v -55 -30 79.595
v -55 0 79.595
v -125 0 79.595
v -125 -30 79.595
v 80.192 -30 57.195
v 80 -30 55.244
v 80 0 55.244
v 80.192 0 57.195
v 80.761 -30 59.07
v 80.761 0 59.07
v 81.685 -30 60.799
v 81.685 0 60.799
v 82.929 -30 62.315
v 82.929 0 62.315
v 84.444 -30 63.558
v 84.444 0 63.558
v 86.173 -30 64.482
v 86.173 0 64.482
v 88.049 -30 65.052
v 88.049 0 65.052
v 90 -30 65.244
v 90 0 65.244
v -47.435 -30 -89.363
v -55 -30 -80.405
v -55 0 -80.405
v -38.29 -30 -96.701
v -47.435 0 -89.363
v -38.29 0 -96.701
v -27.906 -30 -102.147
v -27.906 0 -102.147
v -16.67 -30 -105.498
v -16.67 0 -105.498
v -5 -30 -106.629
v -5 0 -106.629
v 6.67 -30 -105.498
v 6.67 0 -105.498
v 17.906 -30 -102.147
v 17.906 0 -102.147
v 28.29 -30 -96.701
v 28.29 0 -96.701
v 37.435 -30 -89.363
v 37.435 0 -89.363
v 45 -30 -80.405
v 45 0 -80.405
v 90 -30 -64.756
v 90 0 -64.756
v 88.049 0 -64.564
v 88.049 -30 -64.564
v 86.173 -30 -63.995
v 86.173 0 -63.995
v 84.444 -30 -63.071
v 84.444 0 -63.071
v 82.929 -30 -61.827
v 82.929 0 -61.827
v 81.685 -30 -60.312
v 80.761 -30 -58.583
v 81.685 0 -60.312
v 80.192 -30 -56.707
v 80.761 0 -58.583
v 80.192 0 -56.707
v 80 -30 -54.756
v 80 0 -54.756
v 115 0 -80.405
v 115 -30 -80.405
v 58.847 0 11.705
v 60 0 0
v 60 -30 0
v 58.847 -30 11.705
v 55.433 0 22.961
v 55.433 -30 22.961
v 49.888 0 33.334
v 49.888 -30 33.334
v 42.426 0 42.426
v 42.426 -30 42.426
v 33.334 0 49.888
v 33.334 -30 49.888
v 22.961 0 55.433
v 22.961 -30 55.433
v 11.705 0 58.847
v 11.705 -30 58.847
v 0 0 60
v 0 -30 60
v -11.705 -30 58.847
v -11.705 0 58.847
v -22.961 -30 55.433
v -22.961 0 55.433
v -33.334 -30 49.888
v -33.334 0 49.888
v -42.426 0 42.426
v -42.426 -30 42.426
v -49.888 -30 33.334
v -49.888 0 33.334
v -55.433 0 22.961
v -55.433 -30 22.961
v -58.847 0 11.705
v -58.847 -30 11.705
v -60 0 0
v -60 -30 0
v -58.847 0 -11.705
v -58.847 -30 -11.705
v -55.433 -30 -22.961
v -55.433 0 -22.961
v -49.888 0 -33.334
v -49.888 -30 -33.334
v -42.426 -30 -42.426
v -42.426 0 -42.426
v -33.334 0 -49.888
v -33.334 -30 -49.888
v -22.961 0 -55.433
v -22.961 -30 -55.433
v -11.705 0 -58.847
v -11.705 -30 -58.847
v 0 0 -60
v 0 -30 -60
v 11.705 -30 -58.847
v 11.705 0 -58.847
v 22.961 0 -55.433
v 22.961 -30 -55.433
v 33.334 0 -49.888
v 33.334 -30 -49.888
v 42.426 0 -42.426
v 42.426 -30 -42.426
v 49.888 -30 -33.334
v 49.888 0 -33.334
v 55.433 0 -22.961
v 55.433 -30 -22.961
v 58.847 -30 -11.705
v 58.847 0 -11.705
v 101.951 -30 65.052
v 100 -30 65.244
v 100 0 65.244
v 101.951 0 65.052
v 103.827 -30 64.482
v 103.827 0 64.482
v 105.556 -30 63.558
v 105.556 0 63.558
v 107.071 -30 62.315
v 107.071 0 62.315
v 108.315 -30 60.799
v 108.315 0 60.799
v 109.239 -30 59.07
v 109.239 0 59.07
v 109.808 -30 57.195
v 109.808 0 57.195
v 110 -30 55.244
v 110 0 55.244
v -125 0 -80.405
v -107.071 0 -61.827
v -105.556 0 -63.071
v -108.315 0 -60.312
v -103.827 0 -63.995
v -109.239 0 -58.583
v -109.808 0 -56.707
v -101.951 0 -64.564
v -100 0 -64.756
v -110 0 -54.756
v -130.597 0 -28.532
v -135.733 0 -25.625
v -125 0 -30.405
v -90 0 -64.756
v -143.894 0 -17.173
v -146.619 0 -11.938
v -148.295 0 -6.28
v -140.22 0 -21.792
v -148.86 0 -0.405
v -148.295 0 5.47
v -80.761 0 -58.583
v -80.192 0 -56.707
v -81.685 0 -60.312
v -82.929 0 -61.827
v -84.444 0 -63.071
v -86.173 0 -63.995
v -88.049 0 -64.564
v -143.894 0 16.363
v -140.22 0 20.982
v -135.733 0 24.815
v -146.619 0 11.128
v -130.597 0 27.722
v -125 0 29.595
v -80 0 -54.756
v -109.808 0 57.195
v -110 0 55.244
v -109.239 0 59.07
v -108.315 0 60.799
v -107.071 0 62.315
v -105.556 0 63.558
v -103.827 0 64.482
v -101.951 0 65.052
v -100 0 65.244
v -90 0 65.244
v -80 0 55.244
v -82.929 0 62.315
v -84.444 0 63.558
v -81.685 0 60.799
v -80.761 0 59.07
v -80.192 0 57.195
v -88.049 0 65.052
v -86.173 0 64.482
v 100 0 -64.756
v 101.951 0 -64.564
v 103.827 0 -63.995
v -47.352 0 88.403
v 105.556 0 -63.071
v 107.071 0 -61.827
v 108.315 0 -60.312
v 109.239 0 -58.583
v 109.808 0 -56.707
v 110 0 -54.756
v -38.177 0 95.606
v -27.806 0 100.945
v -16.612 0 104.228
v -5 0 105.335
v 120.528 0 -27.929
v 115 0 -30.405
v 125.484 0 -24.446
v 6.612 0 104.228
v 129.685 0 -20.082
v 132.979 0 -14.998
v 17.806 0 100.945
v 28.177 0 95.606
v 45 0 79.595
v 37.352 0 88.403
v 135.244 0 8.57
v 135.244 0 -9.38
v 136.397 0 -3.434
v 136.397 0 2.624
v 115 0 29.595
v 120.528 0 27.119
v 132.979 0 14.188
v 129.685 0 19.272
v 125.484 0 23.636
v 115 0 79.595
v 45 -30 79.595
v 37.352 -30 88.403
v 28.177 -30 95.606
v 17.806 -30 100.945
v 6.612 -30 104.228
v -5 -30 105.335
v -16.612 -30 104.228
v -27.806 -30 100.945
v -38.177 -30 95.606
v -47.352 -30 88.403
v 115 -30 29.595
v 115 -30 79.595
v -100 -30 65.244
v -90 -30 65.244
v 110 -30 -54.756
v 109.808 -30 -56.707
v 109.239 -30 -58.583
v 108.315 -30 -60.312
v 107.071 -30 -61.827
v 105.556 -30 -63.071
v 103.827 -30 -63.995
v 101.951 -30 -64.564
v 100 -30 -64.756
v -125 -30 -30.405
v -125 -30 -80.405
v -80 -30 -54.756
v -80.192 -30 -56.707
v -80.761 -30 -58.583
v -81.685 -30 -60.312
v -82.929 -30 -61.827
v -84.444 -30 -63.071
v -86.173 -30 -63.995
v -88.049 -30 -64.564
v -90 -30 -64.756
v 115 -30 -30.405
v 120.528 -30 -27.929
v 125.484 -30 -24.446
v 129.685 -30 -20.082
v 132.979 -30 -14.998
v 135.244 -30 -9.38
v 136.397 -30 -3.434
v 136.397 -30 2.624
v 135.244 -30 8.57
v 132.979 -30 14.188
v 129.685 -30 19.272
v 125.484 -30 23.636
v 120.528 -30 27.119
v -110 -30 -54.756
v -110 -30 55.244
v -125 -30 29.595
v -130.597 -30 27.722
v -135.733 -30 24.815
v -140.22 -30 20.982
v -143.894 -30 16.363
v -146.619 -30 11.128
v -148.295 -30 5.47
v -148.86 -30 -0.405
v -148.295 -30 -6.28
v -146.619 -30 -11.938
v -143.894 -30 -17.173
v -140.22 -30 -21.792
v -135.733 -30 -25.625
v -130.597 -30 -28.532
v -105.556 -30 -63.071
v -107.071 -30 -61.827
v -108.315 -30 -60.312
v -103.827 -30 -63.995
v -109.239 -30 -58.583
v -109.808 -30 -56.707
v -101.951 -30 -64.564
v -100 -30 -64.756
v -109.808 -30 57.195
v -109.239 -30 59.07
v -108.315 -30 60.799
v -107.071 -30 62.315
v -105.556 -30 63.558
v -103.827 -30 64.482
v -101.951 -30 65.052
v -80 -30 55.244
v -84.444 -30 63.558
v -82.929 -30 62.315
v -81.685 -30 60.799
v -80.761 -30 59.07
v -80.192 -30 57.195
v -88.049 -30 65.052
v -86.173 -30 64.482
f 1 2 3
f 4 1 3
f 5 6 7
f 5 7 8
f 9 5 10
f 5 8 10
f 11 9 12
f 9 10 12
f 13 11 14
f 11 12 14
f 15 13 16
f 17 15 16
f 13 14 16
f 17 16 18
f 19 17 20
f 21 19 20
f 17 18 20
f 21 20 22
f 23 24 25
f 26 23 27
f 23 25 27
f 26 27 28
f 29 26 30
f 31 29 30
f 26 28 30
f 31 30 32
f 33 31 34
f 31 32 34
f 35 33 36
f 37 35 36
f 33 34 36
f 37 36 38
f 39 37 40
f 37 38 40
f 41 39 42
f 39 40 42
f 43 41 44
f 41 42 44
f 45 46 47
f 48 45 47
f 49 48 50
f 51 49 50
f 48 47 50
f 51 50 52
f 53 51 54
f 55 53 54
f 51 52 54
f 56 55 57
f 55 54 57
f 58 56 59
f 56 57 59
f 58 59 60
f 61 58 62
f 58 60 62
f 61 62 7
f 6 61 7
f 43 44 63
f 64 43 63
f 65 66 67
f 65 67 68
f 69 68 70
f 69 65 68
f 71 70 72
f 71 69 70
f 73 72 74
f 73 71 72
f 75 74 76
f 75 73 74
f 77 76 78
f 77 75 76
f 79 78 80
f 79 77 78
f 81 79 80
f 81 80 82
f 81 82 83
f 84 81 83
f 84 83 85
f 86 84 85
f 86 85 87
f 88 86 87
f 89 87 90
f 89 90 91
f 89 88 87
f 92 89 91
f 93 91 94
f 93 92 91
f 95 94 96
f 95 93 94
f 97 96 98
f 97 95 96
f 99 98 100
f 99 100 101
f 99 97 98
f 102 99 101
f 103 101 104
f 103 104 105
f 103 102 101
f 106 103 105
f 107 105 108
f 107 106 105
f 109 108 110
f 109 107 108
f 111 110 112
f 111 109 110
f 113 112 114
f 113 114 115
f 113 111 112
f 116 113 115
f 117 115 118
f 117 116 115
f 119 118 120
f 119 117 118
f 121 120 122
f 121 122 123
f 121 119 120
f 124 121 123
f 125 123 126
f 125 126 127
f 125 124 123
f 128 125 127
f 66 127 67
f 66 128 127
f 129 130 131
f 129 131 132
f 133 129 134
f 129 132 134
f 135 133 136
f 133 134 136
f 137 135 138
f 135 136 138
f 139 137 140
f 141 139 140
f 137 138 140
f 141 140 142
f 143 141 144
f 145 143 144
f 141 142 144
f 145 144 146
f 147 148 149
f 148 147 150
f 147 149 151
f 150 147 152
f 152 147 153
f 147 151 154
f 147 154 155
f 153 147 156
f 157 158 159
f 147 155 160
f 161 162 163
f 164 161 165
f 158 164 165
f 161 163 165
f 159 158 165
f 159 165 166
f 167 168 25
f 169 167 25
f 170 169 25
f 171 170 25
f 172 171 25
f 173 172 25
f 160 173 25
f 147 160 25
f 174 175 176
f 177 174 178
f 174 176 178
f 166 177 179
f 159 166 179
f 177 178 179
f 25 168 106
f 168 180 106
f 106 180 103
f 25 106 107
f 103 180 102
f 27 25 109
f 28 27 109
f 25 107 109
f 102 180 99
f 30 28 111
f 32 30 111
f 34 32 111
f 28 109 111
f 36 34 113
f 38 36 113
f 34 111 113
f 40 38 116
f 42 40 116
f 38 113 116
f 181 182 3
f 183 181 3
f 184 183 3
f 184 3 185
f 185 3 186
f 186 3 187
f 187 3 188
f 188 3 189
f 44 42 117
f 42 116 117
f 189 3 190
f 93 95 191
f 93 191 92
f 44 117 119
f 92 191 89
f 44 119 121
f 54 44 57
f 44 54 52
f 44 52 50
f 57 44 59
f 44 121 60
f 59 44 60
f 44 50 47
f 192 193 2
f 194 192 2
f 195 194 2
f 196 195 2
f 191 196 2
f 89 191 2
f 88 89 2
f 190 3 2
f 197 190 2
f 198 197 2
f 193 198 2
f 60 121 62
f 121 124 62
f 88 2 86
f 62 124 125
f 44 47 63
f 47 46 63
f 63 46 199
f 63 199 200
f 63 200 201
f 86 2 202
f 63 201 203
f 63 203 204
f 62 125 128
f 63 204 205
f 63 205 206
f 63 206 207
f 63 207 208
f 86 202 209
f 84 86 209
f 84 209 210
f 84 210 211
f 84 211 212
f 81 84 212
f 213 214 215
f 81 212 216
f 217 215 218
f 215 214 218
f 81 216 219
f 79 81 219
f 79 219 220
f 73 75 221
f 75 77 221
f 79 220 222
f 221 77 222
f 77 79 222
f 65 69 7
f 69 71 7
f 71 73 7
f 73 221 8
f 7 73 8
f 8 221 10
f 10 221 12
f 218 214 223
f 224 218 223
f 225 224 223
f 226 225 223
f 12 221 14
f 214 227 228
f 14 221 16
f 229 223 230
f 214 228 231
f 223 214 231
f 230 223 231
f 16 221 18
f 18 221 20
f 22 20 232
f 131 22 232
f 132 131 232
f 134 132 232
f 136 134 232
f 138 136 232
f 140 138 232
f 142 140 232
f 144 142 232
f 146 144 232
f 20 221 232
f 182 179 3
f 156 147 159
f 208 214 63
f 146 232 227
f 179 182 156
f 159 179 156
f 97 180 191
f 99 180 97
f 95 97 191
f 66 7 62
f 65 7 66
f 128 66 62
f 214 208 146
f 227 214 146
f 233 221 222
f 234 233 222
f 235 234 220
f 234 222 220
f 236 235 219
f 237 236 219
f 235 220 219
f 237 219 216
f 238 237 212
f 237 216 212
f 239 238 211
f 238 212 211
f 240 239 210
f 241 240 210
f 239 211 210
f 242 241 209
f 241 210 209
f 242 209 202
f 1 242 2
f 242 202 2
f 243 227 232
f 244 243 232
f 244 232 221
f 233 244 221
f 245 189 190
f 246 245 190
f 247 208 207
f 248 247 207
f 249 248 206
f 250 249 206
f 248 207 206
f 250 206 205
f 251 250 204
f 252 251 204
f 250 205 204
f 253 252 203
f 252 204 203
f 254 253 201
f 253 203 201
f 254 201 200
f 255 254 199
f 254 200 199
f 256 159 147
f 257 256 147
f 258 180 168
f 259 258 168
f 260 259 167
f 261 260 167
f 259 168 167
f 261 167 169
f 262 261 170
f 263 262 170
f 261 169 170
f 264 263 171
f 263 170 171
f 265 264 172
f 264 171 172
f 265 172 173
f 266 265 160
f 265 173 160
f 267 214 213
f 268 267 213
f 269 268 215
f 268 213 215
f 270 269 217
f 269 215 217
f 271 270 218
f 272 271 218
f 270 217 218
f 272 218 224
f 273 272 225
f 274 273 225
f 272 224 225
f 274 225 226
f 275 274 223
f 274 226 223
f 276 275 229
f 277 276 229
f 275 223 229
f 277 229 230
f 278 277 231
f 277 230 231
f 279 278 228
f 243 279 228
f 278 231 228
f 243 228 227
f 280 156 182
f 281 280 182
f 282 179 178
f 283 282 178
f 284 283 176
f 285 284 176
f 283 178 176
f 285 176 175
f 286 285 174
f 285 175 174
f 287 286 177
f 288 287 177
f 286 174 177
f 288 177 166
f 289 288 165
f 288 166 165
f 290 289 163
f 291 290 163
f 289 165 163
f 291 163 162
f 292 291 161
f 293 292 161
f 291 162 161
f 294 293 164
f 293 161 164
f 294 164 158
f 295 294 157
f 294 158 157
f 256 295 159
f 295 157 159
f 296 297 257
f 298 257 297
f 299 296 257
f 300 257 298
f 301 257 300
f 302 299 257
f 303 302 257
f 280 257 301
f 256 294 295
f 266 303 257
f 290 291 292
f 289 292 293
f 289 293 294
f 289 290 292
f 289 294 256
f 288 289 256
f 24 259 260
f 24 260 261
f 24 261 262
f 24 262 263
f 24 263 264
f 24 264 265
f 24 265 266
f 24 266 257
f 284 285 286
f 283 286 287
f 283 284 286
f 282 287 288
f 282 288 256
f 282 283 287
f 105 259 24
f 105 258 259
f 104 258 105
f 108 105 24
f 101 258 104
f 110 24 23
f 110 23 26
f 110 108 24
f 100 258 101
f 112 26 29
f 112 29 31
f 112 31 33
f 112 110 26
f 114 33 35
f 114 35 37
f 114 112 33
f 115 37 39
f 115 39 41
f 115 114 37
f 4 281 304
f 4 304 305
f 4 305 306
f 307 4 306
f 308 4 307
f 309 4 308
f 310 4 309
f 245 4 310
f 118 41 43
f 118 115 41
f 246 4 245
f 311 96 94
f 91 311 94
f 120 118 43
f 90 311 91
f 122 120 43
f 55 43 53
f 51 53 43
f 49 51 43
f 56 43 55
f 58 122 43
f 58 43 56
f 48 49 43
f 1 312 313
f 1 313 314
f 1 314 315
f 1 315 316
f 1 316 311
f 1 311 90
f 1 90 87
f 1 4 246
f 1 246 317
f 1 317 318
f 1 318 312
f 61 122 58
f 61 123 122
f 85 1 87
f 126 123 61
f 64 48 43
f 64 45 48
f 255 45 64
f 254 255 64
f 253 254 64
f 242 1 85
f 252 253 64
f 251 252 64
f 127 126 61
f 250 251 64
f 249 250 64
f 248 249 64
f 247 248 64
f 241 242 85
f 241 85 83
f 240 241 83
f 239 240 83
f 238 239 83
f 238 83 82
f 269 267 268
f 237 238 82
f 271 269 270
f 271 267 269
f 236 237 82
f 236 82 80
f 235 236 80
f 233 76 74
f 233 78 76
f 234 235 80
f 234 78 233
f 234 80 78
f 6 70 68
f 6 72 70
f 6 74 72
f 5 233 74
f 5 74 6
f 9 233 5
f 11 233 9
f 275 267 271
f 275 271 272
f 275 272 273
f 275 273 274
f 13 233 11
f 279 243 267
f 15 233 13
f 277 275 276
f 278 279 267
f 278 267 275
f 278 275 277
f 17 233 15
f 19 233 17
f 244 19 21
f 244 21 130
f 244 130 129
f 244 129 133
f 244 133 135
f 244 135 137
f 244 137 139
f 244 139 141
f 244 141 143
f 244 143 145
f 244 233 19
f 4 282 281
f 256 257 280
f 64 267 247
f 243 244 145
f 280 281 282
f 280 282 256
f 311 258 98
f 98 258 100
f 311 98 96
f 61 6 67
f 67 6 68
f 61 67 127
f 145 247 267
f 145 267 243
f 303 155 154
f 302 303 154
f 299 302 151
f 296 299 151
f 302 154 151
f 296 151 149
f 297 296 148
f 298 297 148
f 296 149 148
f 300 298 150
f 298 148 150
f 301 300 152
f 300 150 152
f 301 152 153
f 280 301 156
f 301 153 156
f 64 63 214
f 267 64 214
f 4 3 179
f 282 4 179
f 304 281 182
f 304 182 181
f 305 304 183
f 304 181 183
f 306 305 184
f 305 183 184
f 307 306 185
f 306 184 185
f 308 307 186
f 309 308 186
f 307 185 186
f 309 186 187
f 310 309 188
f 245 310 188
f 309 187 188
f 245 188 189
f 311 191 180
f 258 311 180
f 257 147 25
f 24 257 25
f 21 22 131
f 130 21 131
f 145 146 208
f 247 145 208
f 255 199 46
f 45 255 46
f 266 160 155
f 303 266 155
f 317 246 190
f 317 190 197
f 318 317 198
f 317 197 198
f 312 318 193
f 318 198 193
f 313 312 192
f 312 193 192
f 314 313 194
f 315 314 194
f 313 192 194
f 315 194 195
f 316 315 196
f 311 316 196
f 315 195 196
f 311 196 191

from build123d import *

# Parameters (mm, degrees)
F0_R     = 60
F1_DEPTH = 30


with BuildPart() as f1:
    # F0 (on Front) → F1 (new body)
    with BuildSketch(Plane.XZ):
        Polygon((-55, 79.594996), (-125, 79.594996), (-125, 29.594996), (-125, -30.405004), (-125, -80.405004), (-55, -80.405004), (45, -80.405004), (115, -80.405004), (115, -30.405004), (115, 29.594996), (115, 79.594996), (45, 79.594996), align=None)
        with BuildLine():
            ThreePointArc((-110, 55.243649), (-107.071068, 62.314716), (-100, 65.243649))
            Line((-100, 65.243649), (-90, 65.243649))
            ThreePointArc((-90, 65.243649), (-82.928932, 62.314716), (-80, 55.243649))
            Line((-80, 55.243649), (-80, -54.756351))
            ThreePointArc((-80, -54.756351), (-82.928932, -61.827419), (-90, -64.756351))
            Line((-90, -64.756351), (-100, -64.756351))
            ThreePointArc((-100, -64.756351), (-107.071068, -61.827419), (-110, -54.756351))
            Line((-110, -54.756351), (-110, 55.243649))
        make_face(mode=Mode.SUBTRACT)
        Circle(F0_R, mode=Mode.SUBTRACT)
        with BuildLine():
            ThreePointArc((80, 55.243649), (82.928932, 62.314716), (90, 65.243649))
            Line((90, 65.243649), (100, 65.243649))
            ThreePointArc((100, 65.243649), (107.071068, 62.314716), (110, 55.243649))
            Line((110, 55.243649), (110, -54.756351))
            ThreePointArc((110, -54.756351), (107.071068, -61.827419), (100, -64.756351))
            Line((100, -64.756351), (90, -64.756351))
            ThreePointArc((90, -64.756351), (82.928932, -61.827419), (80, -54.756351))
            Line((80, -54.756351), (80, 55.243649))
        make_face(mode=Mode.SUBTRACT)
        with BuildLine():
            Line((-125, -30.405004), (-125, 29.594996))
            ThreePointArc((-125, 29.594996), (-148.860331, -0.405004), (-125, -30.405004))
        make_face()
        with BuildLine():
            ThreePointArc((45, 79.594996), (-5, 105.335071), (-55, 79.594996))
            Line((-55, 79.594996), (45, 79.594996))
        make_face()
        with BuildLine():
            Line((45, -80.405004), (-55, -80.405004))
            ThreePointArc((-55, -80.405004), (-5, -106.628586), (45, -80.405004))
        make_face()
        with BuildLine():
            ThreePointArc((115, -30.405004), (136.54259, -0.405004), (115, 29.594996))
            Line((115, 29.594996), (115, -30.405004))
        make_face()
    extrude(amount=F1_DEPTH)


solid = f1.part
